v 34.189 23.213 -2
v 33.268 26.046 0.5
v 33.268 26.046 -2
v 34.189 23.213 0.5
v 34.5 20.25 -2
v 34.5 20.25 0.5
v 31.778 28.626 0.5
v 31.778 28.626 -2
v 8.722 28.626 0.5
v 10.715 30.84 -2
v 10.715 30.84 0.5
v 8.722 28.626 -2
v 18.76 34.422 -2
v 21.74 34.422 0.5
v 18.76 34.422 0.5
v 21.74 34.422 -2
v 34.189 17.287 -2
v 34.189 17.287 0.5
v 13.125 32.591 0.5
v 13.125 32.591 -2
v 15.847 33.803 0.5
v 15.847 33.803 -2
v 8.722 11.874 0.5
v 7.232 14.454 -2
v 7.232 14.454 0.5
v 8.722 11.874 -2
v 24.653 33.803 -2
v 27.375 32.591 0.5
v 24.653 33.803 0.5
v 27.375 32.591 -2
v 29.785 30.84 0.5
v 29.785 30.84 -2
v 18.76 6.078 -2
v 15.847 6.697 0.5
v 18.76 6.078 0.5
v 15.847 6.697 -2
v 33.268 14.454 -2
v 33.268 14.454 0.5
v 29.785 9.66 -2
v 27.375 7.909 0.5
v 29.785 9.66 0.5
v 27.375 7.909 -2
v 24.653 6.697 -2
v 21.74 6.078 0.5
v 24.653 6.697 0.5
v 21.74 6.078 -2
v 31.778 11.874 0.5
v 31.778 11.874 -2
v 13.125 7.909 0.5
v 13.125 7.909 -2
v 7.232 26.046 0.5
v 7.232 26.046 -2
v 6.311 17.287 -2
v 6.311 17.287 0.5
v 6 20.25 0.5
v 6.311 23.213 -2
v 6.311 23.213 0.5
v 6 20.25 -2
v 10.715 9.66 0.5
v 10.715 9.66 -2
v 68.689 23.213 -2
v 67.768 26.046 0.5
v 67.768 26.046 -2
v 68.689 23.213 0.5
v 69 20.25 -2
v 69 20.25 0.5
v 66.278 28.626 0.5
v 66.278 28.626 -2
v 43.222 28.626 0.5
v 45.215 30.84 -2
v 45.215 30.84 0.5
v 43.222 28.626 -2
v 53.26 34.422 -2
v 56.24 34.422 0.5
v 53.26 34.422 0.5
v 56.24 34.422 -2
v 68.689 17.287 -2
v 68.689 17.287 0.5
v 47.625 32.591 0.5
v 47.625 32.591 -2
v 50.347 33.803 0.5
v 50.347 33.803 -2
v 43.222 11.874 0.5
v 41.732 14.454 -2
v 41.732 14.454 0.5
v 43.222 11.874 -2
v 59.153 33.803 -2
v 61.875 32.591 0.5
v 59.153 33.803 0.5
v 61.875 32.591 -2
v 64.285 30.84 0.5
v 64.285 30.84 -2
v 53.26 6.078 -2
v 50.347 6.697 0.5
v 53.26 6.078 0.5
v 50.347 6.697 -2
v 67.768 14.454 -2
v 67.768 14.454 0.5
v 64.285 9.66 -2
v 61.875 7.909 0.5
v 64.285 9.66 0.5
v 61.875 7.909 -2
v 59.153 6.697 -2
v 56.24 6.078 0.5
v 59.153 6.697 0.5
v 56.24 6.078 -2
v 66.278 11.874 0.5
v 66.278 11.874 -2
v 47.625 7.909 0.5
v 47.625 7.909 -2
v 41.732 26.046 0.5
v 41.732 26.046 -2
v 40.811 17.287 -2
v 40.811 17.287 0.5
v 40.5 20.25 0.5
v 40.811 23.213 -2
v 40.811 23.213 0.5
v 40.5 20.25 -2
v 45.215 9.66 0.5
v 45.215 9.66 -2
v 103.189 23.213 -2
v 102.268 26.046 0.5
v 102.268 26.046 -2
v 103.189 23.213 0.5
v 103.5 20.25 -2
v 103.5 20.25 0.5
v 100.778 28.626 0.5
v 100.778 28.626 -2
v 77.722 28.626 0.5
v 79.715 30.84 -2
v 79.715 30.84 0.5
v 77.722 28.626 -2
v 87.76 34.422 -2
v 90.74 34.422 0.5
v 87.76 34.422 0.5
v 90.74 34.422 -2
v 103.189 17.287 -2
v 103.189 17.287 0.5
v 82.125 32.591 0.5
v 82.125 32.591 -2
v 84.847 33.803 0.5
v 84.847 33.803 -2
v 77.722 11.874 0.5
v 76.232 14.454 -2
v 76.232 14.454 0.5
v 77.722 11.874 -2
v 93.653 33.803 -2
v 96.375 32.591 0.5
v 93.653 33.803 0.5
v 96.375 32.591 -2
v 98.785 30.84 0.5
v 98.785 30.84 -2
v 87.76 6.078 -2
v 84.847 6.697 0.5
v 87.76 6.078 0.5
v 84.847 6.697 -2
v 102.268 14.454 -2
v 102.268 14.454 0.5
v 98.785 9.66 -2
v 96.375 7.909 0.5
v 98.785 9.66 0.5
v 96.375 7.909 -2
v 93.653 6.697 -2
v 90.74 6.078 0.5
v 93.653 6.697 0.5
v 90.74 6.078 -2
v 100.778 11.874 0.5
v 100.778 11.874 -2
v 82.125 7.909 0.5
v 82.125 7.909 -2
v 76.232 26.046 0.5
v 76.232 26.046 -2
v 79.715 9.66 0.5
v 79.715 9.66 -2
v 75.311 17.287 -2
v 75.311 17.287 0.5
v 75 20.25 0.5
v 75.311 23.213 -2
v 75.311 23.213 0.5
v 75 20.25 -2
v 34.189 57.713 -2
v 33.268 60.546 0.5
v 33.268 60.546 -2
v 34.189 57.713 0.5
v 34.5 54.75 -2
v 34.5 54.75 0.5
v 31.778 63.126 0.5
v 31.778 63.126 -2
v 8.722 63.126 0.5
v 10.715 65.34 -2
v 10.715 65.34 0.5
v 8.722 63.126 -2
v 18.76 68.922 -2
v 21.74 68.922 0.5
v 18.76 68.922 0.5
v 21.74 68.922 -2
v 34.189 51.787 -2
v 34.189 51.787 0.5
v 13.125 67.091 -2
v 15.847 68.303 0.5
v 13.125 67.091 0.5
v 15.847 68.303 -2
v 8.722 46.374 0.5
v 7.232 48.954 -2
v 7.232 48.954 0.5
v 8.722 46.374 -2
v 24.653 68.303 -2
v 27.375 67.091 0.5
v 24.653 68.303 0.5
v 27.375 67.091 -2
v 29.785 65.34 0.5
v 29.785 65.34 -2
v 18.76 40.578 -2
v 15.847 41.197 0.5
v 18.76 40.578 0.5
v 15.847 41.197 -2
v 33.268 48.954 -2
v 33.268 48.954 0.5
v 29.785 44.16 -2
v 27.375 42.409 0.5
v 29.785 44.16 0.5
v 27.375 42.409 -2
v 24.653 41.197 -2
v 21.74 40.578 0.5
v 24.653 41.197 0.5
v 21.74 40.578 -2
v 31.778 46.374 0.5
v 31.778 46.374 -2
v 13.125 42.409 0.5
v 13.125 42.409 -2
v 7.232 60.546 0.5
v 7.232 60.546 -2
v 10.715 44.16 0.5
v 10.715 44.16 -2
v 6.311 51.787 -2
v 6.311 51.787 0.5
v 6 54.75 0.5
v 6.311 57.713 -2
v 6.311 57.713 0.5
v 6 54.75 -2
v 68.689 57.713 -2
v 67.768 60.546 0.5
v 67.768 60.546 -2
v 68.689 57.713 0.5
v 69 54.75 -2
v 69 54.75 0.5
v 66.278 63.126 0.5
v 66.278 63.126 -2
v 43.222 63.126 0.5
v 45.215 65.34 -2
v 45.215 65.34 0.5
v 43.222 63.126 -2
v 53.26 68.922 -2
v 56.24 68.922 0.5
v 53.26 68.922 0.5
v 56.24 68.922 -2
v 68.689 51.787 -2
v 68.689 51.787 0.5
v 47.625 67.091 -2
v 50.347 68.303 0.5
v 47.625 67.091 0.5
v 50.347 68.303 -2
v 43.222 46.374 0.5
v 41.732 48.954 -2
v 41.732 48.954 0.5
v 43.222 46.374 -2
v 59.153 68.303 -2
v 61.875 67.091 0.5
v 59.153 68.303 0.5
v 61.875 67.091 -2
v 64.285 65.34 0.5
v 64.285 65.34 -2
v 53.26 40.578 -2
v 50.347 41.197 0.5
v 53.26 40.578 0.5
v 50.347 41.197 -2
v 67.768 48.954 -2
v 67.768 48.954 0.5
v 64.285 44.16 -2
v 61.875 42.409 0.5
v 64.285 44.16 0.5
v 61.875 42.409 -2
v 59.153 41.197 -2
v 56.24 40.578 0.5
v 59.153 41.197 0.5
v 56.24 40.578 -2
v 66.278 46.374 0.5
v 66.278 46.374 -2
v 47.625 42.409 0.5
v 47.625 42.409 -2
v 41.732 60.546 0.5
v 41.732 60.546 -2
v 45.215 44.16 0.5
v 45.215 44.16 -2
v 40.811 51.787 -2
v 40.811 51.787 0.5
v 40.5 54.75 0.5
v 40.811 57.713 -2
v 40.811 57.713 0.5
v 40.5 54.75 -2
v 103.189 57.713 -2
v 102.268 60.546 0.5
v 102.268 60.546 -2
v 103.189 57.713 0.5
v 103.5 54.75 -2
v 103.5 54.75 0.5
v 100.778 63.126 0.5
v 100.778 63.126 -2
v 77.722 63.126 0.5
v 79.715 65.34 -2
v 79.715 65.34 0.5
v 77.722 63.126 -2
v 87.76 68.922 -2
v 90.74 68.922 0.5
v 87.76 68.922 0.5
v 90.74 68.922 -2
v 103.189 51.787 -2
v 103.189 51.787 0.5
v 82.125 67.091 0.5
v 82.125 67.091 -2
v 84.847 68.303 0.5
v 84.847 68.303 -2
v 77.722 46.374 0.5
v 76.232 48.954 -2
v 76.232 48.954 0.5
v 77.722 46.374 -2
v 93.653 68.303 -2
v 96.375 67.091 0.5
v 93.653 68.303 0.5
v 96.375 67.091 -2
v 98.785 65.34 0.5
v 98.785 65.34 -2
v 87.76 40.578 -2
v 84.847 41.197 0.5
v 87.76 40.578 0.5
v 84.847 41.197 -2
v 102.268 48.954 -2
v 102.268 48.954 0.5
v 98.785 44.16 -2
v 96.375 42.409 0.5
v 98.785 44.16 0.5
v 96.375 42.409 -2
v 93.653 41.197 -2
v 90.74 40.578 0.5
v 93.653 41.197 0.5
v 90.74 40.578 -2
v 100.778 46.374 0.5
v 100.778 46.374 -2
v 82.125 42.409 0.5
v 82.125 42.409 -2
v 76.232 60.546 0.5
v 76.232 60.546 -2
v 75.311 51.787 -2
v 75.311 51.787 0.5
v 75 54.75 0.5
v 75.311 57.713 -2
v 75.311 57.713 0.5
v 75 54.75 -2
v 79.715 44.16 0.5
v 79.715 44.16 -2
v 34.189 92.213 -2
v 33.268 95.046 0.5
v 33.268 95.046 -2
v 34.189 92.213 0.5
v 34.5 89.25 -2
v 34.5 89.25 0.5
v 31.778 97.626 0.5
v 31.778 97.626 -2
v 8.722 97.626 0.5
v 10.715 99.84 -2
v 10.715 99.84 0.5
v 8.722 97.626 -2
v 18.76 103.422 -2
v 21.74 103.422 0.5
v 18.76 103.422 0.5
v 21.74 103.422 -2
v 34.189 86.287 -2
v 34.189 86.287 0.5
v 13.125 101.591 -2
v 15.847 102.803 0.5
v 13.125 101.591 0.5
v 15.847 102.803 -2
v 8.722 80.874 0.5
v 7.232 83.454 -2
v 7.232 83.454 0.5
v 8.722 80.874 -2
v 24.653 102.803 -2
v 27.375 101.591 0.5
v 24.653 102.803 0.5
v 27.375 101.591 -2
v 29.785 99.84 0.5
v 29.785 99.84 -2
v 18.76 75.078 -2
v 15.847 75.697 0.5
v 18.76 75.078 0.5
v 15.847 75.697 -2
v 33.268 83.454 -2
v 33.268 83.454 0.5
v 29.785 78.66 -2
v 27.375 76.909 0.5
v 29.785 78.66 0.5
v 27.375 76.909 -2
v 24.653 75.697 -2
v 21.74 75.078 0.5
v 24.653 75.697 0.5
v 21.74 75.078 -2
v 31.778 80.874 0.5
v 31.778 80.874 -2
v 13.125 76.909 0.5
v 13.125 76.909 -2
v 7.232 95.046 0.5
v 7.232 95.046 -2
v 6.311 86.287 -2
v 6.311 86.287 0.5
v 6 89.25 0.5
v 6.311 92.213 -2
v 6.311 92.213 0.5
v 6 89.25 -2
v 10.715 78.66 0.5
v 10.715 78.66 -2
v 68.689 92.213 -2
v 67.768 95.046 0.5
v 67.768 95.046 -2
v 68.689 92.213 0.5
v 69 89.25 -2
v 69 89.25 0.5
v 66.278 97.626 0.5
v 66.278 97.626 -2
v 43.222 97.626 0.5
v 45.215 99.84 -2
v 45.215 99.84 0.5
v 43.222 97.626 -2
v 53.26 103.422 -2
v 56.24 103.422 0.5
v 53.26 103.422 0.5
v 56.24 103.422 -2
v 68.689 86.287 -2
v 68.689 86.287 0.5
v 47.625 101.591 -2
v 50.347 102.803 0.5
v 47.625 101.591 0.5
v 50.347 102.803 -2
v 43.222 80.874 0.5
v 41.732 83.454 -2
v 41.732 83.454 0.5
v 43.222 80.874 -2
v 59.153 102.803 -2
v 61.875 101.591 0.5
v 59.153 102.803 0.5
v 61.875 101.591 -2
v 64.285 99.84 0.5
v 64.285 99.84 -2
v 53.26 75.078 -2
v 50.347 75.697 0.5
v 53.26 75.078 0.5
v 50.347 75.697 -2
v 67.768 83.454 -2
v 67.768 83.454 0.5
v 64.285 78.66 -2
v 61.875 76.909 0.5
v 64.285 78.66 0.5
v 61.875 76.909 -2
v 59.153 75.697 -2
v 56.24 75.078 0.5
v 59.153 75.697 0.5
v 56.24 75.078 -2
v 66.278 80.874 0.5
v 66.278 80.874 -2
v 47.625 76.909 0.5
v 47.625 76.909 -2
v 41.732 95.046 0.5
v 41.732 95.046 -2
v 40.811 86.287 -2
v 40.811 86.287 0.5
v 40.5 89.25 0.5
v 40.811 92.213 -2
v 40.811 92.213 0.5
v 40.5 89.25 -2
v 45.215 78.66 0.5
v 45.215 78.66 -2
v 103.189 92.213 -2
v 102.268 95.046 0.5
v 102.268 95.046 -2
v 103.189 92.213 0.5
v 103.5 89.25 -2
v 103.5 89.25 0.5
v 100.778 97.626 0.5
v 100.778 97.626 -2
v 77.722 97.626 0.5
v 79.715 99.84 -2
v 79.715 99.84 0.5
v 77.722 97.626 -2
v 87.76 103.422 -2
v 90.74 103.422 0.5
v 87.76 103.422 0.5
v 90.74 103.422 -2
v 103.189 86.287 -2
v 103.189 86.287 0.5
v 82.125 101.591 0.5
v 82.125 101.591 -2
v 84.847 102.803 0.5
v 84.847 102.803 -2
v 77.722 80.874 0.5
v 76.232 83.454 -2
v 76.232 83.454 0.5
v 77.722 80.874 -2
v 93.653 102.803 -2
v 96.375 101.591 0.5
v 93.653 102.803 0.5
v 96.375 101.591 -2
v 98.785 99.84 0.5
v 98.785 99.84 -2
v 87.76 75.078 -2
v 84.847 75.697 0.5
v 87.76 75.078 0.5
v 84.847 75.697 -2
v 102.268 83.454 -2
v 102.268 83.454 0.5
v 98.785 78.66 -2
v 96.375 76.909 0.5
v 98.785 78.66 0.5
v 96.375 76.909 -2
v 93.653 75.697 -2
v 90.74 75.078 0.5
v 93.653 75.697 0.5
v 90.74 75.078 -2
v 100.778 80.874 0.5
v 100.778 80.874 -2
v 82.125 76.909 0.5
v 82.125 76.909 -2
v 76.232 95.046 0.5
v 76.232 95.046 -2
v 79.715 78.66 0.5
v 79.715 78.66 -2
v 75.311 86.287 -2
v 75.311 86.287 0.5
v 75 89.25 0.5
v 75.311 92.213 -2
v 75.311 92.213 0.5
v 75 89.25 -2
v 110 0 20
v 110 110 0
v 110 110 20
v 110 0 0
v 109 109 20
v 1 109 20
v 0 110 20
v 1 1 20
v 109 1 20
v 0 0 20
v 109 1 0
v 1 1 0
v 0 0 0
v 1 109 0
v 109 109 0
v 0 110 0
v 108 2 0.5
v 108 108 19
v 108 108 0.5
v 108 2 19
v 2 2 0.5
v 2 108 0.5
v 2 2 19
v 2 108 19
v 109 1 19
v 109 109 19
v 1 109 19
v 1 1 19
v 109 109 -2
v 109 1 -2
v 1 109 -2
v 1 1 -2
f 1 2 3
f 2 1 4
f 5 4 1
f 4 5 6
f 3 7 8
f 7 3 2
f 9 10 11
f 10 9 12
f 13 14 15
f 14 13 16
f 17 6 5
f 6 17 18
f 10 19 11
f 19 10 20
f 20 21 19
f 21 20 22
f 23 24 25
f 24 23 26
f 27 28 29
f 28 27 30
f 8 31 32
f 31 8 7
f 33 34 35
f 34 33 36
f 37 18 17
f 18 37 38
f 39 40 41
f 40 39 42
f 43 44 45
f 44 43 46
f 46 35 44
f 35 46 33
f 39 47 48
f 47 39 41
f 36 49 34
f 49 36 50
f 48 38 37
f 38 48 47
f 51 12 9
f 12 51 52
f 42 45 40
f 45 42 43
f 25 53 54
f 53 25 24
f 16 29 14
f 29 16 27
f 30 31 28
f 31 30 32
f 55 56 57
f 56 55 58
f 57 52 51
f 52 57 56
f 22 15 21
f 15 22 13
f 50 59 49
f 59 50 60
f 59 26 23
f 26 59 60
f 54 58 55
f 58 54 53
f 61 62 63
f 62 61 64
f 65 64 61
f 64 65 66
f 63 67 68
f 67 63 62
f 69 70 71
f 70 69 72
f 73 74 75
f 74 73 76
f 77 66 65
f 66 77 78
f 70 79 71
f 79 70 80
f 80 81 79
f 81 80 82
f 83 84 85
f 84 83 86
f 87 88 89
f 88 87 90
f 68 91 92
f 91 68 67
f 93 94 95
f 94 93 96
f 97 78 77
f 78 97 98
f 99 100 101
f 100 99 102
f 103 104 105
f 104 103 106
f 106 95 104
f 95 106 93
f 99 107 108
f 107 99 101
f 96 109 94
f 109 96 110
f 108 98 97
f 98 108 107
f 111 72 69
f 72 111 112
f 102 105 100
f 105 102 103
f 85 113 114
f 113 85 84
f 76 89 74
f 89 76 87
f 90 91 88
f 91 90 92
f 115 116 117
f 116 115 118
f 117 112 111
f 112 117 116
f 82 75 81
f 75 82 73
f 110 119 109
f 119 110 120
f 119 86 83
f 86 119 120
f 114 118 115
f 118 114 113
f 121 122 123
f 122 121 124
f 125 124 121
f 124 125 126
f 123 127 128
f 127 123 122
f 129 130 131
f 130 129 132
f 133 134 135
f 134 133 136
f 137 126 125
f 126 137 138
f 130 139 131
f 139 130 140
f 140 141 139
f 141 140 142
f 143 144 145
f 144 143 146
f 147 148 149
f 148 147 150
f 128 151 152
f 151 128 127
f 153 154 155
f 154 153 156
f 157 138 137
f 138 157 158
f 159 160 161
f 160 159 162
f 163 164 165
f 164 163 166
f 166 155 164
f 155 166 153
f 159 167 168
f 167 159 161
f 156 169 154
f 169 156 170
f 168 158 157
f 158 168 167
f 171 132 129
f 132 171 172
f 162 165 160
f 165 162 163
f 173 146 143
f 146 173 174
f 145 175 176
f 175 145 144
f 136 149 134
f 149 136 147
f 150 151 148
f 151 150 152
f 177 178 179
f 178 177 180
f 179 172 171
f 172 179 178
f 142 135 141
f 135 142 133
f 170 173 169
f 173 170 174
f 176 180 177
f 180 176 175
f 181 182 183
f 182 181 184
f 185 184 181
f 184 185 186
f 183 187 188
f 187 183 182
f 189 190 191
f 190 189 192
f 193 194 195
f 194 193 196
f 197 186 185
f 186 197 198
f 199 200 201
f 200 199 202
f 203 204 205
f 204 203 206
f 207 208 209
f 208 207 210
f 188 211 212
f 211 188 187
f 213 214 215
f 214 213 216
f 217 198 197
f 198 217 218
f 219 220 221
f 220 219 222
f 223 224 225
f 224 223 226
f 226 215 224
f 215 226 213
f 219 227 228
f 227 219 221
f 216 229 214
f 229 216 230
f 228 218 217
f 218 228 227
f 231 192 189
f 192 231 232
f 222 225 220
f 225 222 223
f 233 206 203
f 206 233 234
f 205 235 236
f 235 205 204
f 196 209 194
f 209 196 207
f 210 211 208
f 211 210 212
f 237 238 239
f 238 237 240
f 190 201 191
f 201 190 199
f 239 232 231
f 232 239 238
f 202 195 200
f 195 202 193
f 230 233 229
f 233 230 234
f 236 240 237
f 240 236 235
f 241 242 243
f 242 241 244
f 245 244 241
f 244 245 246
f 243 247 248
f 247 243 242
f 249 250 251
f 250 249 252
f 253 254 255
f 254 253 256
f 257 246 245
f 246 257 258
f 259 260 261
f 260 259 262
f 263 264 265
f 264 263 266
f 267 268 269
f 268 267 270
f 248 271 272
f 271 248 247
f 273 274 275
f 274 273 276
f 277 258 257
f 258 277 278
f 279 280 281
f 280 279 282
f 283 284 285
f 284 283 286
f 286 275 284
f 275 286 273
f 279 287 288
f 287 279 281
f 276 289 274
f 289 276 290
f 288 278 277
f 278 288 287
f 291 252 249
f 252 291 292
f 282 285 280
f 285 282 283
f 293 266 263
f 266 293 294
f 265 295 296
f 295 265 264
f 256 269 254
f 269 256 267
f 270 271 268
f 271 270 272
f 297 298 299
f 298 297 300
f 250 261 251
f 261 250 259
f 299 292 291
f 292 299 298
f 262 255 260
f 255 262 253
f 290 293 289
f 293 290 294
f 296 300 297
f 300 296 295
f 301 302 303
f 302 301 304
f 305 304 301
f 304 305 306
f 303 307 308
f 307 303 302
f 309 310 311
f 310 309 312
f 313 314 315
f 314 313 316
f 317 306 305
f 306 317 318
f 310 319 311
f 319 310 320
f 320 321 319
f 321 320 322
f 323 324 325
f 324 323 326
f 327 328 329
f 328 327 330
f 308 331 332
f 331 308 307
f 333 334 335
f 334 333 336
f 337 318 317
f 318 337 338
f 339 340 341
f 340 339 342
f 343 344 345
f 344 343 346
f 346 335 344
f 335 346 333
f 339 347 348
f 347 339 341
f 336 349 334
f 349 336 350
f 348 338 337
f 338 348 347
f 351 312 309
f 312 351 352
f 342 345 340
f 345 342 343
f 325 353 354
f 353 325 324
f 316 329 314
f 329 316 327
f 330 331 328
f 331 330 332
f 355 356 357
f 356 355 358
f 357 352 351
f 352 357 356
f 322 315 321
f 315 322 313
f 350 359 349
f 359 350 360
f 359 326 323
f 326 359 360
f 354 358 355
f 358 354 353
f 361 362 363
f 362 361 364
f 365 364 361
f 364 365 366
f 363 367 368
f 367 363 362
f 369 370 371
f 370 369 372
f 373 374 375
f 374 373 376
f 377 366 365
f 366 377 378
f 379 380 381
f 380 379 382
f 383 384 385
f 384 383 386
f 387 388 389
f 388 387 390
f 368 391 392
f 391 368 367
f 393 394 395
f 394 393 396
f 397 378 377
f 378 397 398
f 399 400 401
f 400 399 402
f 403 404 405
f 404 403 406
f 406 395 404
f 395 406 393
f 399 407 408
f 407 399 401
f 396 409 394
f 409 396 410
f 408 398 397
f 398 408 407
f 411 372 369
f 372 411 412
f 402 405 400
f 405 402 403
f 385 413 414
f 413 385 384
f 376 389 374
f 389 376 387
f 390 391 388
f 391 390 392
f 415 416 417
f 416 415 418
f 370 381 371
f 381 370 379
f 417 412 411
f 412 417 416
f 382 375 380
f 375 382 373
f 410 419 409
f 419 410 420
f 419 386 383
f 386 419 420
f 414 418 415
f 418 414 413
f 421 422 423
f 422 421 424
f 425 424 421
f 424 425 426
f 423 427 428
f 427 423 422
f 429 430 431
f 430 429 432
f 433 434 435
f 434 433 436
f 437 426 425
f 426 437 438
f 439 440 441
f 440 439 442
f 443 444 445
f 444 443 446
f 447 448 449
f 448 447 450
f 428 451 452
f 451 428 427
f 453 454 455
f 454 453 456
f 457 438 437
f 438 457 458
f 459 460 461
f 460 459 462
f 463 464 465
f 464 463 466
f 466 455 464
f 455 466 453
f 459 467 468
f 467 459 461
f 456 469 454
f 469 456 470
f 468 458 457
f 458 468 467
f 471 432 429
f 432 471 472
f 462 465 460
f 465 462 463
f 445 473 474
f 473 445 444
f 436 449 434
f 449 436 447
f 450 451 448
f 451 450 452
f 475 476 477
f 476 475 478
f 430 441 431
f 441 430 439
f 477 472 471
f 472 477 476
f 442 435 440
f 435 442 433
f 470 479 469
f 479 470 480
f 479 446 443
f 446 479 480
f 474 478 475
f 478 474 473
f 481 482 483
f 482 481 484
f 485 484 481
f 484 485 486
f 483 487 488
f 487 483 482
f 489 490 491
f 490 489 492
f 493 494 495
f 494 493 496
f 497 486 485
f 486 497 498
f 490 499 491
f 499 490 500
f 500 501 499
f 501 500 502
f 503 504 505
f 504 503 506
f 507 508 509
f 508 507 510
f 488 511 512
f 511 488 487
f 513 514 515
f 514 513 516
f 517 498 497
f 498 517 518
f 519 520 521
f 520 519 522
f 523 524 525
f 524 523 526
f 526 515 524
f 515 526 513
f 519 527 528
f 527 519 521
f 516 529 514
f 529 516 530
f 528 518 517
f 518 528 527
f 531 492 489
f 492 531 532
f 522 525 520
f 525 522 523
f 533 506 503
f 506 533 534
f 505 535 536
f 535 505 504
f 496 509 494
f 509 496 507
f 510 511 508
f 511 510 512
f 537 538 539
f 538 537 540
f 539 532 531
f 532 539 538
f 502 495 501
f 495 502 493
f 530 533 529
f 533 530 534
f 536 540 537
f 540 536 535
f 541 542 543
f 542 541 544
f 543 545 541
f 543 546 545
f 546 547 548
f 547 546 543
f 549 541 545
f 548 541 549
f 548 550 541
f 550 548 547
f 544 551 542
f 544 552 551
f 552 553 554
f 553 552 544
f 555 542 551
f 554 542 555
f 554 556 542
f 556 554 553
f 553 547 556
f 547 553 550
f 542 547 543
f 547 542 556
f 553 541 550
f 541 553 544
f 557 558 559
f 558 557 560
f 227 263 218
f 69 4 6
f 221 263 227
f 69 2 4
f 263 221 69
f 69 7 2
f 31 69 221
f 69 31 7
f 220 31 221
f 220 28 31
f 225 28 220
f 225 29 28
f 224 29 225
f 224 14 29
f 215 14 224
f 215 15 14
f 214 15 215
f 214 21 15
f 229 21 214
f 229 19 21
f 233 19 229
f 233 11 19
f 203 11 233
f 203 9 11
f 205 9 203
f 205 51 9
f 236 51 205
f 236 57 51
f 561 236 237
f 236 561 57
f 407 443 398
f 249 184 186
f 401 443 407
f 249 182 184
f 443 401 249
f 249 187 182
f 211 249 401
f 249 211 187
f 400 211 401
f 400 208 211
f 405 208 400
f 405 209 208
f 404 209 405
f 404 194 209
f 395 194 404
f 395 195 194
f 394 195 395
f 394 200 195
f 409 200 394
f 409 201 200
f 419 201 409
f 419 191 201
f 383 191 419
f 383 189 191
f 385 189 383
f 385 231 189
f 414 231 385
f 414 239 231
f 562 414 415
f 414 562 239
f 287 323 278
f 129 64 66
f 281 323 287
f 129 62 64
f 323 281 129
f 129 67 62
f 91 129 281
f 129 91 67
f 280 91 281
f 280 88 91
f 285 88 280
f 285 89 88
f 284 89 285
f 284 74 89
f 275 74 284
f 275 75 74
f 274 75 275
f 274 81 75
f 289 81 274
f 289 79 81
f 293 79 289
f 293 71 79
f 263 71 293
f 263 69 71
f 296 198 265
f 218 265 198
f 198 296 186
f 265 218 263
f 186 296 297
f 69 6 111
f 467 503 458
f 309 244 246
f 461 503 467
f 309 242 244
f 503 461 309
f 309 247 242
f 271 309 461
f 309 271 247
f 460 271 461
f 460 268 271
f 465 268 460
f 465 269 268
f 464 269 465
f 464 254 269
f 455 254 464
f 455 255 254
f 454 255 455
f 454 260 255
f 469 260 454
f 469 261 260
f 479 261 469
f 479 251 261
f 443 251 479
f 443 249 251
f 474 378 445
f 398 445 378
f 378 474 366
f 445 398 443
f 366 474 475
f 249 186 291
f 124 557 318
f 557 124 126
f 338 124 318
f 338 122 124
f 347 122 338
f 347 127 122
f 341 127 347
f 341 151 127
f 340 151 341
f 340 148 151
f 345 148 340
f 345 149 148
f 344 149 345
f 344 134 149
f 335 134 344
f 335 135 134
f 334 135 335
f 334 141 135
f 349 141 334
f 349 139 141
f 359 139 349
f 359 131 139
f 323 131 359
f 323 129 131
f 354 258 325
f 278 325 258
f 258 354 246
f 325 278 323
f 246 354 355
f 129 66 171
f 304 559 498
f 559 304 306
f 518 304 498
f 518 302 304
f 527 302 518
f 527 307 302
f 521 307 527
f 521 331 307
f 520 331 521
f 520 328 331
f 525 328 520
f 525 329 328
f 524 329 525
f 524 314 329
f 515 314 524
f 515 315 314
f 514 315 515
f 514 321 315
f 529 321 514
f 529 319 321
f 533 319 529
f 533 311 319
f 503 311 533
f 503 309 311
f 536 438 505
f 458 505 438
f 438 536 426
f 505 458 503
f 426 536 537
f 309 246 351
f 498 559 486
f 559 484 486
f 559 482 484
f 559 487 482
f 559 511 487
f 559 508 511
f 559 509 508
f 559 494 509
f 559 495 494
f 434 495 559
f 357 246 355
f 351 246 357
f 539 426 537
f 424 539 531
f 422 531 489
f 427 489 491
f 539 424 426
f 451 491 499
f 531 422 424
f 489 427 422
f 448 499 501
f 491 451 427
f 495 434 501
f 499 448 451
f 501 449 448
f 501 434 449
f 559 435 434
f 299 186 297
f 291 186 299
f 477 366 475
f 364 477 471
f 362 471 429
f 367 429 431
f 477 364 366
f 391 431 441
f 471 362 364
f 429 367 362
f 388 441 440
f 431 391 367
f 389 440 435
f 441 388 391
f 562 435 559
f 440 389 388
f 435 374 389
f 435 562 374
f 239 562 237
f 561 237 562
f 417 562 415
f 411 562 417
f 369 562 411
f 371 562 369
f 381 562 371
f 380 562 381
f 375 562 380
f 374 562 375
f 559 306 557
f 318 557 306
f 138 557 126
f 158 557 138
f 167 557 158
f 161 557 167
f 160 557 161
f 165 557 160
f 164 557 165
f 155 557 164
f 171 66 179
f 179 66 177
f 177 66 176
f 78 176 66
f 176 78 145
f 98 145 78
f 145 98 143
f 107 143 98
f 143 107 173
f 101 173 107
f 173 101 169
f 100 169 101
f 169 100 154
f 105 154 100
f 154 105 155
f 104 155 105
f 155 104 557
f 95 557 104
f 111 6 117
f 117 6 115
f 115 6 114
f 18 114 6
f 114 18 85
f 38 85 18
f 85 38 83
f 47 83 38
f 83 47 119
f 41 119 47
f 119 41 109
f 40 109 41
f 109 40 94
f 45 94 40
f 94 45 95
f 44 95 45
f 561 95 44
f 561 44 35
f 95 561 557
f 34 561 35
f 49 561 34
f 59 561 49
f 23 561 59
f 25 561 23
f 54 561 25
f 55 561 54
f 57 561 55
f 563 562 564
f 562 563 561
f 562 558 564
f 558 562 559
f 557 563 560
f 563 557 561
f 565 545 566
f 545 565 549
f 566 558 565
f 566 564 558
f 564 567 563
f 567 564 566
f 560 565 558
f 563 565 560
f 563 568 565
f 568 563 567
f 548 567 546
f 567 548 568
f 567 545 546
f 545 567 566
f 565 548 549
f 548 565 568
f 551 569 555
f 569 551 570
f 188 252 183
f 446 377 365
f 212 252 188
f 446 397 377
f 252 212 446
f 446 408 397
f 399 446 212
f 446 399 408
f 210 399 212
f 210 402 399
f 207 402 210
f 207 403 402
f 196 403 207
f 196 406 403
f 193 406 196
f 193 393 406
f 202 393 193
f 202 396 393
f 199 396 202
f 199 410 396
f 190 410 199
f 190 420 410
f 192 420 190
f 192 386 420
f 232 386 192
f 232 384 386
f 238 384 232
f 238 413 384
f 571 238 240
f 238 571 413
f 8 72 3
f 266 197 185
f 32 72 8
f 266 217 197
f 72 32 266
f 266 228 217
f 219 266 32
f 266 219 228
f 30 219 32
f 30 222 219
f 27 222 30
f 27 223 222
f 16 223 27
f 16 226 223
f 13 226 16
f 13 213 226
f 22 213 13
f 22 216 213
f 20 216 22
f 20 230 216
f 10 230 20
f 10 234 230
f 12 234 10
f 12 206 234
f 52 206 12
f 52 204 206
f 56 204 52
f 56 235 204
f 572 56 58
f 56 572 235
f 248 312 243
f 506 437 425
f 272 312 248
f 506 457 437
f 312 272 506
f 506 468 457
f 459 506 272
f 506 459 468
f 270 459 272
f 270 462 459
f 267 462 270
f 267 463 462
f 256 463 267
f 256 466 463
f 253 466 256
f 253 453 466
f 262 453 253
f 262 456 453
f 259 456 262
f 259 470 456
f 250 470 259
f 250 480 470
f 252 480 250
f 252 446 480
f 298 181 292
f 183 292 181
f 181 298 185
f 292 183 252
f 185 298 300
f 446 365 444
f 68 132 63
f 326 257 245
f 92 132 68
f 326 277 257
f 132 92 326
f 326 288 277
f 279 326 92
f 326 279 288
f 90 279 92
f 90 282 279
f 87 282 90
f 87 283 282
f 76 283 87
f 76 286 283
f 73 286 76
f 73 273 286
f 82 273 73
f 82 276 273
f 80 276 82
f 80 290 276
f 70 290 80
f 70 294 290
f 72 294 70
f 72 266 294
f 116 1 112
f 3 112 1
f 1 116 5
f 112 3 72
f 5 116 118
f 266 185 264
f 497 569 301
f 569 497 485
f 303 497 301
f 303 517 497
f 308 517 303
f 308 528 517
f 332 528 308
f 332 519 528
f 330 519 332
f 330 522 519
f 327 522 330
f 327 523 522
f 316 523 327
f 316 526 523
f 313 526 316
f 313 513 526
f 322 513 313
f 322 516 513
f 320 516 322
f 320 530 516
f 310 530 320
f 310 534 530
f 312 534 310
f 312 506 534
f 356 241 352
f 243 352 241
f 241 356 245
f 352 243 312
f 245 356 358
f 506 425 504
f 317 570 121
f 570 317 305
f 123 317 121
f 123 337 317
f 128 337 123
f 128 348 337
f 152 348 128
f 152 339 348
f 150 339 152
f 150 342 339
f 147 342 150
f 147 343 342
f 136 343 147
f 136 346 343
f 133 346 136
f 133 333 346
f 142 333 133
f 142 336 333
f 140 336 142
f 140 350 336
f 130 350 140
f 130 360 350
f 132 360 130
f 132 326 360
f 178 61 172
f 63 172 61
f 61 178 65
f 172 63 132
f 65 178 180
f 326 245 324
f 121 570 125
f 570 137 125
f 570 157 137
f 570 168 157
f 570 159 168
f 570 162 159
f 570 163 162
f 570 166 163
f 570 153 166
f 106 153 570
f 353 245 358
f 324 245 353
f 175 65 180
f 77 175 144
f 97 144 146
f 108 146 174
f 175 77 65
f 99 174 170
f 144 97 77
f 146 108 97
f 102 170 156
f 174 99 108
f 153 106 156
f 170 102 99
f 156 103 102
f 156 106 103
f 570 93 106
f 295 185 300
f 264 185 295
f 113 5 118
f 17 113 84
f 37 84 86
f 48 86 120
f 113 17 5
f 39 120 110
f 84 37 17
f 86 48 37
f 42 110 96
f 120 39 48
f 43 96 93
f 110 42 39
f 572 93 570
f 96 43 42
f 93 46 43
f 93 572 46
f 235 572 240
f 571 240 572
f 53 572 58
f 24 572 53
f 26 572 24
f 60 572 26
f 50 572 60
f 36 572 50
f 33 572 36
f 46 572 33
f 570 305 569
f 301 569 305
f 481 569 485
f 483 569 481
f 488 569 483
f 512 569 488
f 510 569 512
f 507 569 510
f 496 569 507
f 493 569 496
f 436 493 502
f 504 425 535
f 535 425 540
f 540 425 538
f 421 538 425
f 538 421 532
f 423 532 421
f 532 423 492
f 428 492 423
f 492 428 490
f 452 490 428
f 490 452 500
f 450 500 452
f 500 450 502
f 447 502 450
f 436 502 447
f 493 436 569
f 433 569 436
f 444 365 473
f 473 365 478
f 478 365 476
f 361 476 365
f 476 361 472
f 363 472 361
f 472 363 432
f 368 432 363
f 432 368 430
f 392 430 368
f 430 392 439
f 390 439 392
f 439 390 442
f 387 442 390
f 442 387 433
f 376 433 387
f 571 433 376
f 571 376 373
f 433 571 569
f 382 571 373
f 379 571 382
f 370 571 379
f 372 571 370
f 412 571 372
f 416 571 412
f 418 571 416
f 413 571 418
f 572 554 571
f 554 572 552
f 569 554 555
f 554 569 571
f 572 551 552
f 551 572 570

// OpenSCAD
// Coin Sorting Tray Redux
// original by Maxumx https://www.thingiverse.com/thing:30631
// redux by Mikki Friend https://github.com/realmikkifriend

/* [Tray Dimensions] */

tray_wall_thickness = 2;
tray_length = 110;
tray_width = 110;
tray_height = 20;
tray_bed_height = 0.5;
tray_bed_perimeter = 4;

/* [Coin Dimensions] */

coin_diameter = 28.5;
coin_count_x = 3;
coin_count_y = 3;
coin_gap = 6;
coin_middle = false;

//  generation code //

difference() {
    // body of box
    cube([tray_width, tray_length, tray_height]);
    // inner empty space
    translate([tray_wall_thickness, tray_wall_thickness, tray_bed_height])
        cube([
            tray_width - (tray_wall_thickness * 2),
            tray_length - (tray_wall_thickness * 2),
            tray_height - (tray_wall_thickness - 1)
        ]);
    // inner lip
    translate([
        tray_wall_thickness / 2,
        tray_wall_thickness / 2,
        (tray_height - tray_wall_thickness) + 1
    ])
    cube([
        tray_width - tray_wall_thickness,
        tray_length - tray_wall_thickness,
        tray_wall_thickness
    ]);

    create_holes();
}

// bottom lip
difference() {
    // inner lip
    translate([
        tray_wall_thickness / 2,
        tray_wall_thickness / 2,
        -tray_wall_thickness
    ])
    cube([
        tray_width - tray_wall_thickness,
        tray_length - tray_wall_thickness,
        tray_wall_thickness
    ]);

    create_holes();
}

module create_holes() {
    for (i = [0 : coin_count_x - 1]) {
        for (y = [0 : coin_count_y - 1]) {
            translate([
                (y * (coin_gap + coin_diameter)) + tray_bed_perimeter,
                (i * (coin_gap + coin_diameter)) + tray_bed_perimeter,
                -2
            ])
            translate([
                tray_wall_thickness + (coin_diameter / 2),
                tray_wall_thickness + (coin_diameter / 2),
                -tray_wall_thickness + 1
            ])
            cylinder(h = (tray_height + 2), r = (coin_diameter / 2));
        }
    }

	// optional middle hole
	if (coin_middle) {
		translate([tray_width / 2, tray_length / 2, -3]) {
		    cylinder(
		        h = (tray_height+2),
		        r = (coin_diameter/2)
			);
		}
	}
}
